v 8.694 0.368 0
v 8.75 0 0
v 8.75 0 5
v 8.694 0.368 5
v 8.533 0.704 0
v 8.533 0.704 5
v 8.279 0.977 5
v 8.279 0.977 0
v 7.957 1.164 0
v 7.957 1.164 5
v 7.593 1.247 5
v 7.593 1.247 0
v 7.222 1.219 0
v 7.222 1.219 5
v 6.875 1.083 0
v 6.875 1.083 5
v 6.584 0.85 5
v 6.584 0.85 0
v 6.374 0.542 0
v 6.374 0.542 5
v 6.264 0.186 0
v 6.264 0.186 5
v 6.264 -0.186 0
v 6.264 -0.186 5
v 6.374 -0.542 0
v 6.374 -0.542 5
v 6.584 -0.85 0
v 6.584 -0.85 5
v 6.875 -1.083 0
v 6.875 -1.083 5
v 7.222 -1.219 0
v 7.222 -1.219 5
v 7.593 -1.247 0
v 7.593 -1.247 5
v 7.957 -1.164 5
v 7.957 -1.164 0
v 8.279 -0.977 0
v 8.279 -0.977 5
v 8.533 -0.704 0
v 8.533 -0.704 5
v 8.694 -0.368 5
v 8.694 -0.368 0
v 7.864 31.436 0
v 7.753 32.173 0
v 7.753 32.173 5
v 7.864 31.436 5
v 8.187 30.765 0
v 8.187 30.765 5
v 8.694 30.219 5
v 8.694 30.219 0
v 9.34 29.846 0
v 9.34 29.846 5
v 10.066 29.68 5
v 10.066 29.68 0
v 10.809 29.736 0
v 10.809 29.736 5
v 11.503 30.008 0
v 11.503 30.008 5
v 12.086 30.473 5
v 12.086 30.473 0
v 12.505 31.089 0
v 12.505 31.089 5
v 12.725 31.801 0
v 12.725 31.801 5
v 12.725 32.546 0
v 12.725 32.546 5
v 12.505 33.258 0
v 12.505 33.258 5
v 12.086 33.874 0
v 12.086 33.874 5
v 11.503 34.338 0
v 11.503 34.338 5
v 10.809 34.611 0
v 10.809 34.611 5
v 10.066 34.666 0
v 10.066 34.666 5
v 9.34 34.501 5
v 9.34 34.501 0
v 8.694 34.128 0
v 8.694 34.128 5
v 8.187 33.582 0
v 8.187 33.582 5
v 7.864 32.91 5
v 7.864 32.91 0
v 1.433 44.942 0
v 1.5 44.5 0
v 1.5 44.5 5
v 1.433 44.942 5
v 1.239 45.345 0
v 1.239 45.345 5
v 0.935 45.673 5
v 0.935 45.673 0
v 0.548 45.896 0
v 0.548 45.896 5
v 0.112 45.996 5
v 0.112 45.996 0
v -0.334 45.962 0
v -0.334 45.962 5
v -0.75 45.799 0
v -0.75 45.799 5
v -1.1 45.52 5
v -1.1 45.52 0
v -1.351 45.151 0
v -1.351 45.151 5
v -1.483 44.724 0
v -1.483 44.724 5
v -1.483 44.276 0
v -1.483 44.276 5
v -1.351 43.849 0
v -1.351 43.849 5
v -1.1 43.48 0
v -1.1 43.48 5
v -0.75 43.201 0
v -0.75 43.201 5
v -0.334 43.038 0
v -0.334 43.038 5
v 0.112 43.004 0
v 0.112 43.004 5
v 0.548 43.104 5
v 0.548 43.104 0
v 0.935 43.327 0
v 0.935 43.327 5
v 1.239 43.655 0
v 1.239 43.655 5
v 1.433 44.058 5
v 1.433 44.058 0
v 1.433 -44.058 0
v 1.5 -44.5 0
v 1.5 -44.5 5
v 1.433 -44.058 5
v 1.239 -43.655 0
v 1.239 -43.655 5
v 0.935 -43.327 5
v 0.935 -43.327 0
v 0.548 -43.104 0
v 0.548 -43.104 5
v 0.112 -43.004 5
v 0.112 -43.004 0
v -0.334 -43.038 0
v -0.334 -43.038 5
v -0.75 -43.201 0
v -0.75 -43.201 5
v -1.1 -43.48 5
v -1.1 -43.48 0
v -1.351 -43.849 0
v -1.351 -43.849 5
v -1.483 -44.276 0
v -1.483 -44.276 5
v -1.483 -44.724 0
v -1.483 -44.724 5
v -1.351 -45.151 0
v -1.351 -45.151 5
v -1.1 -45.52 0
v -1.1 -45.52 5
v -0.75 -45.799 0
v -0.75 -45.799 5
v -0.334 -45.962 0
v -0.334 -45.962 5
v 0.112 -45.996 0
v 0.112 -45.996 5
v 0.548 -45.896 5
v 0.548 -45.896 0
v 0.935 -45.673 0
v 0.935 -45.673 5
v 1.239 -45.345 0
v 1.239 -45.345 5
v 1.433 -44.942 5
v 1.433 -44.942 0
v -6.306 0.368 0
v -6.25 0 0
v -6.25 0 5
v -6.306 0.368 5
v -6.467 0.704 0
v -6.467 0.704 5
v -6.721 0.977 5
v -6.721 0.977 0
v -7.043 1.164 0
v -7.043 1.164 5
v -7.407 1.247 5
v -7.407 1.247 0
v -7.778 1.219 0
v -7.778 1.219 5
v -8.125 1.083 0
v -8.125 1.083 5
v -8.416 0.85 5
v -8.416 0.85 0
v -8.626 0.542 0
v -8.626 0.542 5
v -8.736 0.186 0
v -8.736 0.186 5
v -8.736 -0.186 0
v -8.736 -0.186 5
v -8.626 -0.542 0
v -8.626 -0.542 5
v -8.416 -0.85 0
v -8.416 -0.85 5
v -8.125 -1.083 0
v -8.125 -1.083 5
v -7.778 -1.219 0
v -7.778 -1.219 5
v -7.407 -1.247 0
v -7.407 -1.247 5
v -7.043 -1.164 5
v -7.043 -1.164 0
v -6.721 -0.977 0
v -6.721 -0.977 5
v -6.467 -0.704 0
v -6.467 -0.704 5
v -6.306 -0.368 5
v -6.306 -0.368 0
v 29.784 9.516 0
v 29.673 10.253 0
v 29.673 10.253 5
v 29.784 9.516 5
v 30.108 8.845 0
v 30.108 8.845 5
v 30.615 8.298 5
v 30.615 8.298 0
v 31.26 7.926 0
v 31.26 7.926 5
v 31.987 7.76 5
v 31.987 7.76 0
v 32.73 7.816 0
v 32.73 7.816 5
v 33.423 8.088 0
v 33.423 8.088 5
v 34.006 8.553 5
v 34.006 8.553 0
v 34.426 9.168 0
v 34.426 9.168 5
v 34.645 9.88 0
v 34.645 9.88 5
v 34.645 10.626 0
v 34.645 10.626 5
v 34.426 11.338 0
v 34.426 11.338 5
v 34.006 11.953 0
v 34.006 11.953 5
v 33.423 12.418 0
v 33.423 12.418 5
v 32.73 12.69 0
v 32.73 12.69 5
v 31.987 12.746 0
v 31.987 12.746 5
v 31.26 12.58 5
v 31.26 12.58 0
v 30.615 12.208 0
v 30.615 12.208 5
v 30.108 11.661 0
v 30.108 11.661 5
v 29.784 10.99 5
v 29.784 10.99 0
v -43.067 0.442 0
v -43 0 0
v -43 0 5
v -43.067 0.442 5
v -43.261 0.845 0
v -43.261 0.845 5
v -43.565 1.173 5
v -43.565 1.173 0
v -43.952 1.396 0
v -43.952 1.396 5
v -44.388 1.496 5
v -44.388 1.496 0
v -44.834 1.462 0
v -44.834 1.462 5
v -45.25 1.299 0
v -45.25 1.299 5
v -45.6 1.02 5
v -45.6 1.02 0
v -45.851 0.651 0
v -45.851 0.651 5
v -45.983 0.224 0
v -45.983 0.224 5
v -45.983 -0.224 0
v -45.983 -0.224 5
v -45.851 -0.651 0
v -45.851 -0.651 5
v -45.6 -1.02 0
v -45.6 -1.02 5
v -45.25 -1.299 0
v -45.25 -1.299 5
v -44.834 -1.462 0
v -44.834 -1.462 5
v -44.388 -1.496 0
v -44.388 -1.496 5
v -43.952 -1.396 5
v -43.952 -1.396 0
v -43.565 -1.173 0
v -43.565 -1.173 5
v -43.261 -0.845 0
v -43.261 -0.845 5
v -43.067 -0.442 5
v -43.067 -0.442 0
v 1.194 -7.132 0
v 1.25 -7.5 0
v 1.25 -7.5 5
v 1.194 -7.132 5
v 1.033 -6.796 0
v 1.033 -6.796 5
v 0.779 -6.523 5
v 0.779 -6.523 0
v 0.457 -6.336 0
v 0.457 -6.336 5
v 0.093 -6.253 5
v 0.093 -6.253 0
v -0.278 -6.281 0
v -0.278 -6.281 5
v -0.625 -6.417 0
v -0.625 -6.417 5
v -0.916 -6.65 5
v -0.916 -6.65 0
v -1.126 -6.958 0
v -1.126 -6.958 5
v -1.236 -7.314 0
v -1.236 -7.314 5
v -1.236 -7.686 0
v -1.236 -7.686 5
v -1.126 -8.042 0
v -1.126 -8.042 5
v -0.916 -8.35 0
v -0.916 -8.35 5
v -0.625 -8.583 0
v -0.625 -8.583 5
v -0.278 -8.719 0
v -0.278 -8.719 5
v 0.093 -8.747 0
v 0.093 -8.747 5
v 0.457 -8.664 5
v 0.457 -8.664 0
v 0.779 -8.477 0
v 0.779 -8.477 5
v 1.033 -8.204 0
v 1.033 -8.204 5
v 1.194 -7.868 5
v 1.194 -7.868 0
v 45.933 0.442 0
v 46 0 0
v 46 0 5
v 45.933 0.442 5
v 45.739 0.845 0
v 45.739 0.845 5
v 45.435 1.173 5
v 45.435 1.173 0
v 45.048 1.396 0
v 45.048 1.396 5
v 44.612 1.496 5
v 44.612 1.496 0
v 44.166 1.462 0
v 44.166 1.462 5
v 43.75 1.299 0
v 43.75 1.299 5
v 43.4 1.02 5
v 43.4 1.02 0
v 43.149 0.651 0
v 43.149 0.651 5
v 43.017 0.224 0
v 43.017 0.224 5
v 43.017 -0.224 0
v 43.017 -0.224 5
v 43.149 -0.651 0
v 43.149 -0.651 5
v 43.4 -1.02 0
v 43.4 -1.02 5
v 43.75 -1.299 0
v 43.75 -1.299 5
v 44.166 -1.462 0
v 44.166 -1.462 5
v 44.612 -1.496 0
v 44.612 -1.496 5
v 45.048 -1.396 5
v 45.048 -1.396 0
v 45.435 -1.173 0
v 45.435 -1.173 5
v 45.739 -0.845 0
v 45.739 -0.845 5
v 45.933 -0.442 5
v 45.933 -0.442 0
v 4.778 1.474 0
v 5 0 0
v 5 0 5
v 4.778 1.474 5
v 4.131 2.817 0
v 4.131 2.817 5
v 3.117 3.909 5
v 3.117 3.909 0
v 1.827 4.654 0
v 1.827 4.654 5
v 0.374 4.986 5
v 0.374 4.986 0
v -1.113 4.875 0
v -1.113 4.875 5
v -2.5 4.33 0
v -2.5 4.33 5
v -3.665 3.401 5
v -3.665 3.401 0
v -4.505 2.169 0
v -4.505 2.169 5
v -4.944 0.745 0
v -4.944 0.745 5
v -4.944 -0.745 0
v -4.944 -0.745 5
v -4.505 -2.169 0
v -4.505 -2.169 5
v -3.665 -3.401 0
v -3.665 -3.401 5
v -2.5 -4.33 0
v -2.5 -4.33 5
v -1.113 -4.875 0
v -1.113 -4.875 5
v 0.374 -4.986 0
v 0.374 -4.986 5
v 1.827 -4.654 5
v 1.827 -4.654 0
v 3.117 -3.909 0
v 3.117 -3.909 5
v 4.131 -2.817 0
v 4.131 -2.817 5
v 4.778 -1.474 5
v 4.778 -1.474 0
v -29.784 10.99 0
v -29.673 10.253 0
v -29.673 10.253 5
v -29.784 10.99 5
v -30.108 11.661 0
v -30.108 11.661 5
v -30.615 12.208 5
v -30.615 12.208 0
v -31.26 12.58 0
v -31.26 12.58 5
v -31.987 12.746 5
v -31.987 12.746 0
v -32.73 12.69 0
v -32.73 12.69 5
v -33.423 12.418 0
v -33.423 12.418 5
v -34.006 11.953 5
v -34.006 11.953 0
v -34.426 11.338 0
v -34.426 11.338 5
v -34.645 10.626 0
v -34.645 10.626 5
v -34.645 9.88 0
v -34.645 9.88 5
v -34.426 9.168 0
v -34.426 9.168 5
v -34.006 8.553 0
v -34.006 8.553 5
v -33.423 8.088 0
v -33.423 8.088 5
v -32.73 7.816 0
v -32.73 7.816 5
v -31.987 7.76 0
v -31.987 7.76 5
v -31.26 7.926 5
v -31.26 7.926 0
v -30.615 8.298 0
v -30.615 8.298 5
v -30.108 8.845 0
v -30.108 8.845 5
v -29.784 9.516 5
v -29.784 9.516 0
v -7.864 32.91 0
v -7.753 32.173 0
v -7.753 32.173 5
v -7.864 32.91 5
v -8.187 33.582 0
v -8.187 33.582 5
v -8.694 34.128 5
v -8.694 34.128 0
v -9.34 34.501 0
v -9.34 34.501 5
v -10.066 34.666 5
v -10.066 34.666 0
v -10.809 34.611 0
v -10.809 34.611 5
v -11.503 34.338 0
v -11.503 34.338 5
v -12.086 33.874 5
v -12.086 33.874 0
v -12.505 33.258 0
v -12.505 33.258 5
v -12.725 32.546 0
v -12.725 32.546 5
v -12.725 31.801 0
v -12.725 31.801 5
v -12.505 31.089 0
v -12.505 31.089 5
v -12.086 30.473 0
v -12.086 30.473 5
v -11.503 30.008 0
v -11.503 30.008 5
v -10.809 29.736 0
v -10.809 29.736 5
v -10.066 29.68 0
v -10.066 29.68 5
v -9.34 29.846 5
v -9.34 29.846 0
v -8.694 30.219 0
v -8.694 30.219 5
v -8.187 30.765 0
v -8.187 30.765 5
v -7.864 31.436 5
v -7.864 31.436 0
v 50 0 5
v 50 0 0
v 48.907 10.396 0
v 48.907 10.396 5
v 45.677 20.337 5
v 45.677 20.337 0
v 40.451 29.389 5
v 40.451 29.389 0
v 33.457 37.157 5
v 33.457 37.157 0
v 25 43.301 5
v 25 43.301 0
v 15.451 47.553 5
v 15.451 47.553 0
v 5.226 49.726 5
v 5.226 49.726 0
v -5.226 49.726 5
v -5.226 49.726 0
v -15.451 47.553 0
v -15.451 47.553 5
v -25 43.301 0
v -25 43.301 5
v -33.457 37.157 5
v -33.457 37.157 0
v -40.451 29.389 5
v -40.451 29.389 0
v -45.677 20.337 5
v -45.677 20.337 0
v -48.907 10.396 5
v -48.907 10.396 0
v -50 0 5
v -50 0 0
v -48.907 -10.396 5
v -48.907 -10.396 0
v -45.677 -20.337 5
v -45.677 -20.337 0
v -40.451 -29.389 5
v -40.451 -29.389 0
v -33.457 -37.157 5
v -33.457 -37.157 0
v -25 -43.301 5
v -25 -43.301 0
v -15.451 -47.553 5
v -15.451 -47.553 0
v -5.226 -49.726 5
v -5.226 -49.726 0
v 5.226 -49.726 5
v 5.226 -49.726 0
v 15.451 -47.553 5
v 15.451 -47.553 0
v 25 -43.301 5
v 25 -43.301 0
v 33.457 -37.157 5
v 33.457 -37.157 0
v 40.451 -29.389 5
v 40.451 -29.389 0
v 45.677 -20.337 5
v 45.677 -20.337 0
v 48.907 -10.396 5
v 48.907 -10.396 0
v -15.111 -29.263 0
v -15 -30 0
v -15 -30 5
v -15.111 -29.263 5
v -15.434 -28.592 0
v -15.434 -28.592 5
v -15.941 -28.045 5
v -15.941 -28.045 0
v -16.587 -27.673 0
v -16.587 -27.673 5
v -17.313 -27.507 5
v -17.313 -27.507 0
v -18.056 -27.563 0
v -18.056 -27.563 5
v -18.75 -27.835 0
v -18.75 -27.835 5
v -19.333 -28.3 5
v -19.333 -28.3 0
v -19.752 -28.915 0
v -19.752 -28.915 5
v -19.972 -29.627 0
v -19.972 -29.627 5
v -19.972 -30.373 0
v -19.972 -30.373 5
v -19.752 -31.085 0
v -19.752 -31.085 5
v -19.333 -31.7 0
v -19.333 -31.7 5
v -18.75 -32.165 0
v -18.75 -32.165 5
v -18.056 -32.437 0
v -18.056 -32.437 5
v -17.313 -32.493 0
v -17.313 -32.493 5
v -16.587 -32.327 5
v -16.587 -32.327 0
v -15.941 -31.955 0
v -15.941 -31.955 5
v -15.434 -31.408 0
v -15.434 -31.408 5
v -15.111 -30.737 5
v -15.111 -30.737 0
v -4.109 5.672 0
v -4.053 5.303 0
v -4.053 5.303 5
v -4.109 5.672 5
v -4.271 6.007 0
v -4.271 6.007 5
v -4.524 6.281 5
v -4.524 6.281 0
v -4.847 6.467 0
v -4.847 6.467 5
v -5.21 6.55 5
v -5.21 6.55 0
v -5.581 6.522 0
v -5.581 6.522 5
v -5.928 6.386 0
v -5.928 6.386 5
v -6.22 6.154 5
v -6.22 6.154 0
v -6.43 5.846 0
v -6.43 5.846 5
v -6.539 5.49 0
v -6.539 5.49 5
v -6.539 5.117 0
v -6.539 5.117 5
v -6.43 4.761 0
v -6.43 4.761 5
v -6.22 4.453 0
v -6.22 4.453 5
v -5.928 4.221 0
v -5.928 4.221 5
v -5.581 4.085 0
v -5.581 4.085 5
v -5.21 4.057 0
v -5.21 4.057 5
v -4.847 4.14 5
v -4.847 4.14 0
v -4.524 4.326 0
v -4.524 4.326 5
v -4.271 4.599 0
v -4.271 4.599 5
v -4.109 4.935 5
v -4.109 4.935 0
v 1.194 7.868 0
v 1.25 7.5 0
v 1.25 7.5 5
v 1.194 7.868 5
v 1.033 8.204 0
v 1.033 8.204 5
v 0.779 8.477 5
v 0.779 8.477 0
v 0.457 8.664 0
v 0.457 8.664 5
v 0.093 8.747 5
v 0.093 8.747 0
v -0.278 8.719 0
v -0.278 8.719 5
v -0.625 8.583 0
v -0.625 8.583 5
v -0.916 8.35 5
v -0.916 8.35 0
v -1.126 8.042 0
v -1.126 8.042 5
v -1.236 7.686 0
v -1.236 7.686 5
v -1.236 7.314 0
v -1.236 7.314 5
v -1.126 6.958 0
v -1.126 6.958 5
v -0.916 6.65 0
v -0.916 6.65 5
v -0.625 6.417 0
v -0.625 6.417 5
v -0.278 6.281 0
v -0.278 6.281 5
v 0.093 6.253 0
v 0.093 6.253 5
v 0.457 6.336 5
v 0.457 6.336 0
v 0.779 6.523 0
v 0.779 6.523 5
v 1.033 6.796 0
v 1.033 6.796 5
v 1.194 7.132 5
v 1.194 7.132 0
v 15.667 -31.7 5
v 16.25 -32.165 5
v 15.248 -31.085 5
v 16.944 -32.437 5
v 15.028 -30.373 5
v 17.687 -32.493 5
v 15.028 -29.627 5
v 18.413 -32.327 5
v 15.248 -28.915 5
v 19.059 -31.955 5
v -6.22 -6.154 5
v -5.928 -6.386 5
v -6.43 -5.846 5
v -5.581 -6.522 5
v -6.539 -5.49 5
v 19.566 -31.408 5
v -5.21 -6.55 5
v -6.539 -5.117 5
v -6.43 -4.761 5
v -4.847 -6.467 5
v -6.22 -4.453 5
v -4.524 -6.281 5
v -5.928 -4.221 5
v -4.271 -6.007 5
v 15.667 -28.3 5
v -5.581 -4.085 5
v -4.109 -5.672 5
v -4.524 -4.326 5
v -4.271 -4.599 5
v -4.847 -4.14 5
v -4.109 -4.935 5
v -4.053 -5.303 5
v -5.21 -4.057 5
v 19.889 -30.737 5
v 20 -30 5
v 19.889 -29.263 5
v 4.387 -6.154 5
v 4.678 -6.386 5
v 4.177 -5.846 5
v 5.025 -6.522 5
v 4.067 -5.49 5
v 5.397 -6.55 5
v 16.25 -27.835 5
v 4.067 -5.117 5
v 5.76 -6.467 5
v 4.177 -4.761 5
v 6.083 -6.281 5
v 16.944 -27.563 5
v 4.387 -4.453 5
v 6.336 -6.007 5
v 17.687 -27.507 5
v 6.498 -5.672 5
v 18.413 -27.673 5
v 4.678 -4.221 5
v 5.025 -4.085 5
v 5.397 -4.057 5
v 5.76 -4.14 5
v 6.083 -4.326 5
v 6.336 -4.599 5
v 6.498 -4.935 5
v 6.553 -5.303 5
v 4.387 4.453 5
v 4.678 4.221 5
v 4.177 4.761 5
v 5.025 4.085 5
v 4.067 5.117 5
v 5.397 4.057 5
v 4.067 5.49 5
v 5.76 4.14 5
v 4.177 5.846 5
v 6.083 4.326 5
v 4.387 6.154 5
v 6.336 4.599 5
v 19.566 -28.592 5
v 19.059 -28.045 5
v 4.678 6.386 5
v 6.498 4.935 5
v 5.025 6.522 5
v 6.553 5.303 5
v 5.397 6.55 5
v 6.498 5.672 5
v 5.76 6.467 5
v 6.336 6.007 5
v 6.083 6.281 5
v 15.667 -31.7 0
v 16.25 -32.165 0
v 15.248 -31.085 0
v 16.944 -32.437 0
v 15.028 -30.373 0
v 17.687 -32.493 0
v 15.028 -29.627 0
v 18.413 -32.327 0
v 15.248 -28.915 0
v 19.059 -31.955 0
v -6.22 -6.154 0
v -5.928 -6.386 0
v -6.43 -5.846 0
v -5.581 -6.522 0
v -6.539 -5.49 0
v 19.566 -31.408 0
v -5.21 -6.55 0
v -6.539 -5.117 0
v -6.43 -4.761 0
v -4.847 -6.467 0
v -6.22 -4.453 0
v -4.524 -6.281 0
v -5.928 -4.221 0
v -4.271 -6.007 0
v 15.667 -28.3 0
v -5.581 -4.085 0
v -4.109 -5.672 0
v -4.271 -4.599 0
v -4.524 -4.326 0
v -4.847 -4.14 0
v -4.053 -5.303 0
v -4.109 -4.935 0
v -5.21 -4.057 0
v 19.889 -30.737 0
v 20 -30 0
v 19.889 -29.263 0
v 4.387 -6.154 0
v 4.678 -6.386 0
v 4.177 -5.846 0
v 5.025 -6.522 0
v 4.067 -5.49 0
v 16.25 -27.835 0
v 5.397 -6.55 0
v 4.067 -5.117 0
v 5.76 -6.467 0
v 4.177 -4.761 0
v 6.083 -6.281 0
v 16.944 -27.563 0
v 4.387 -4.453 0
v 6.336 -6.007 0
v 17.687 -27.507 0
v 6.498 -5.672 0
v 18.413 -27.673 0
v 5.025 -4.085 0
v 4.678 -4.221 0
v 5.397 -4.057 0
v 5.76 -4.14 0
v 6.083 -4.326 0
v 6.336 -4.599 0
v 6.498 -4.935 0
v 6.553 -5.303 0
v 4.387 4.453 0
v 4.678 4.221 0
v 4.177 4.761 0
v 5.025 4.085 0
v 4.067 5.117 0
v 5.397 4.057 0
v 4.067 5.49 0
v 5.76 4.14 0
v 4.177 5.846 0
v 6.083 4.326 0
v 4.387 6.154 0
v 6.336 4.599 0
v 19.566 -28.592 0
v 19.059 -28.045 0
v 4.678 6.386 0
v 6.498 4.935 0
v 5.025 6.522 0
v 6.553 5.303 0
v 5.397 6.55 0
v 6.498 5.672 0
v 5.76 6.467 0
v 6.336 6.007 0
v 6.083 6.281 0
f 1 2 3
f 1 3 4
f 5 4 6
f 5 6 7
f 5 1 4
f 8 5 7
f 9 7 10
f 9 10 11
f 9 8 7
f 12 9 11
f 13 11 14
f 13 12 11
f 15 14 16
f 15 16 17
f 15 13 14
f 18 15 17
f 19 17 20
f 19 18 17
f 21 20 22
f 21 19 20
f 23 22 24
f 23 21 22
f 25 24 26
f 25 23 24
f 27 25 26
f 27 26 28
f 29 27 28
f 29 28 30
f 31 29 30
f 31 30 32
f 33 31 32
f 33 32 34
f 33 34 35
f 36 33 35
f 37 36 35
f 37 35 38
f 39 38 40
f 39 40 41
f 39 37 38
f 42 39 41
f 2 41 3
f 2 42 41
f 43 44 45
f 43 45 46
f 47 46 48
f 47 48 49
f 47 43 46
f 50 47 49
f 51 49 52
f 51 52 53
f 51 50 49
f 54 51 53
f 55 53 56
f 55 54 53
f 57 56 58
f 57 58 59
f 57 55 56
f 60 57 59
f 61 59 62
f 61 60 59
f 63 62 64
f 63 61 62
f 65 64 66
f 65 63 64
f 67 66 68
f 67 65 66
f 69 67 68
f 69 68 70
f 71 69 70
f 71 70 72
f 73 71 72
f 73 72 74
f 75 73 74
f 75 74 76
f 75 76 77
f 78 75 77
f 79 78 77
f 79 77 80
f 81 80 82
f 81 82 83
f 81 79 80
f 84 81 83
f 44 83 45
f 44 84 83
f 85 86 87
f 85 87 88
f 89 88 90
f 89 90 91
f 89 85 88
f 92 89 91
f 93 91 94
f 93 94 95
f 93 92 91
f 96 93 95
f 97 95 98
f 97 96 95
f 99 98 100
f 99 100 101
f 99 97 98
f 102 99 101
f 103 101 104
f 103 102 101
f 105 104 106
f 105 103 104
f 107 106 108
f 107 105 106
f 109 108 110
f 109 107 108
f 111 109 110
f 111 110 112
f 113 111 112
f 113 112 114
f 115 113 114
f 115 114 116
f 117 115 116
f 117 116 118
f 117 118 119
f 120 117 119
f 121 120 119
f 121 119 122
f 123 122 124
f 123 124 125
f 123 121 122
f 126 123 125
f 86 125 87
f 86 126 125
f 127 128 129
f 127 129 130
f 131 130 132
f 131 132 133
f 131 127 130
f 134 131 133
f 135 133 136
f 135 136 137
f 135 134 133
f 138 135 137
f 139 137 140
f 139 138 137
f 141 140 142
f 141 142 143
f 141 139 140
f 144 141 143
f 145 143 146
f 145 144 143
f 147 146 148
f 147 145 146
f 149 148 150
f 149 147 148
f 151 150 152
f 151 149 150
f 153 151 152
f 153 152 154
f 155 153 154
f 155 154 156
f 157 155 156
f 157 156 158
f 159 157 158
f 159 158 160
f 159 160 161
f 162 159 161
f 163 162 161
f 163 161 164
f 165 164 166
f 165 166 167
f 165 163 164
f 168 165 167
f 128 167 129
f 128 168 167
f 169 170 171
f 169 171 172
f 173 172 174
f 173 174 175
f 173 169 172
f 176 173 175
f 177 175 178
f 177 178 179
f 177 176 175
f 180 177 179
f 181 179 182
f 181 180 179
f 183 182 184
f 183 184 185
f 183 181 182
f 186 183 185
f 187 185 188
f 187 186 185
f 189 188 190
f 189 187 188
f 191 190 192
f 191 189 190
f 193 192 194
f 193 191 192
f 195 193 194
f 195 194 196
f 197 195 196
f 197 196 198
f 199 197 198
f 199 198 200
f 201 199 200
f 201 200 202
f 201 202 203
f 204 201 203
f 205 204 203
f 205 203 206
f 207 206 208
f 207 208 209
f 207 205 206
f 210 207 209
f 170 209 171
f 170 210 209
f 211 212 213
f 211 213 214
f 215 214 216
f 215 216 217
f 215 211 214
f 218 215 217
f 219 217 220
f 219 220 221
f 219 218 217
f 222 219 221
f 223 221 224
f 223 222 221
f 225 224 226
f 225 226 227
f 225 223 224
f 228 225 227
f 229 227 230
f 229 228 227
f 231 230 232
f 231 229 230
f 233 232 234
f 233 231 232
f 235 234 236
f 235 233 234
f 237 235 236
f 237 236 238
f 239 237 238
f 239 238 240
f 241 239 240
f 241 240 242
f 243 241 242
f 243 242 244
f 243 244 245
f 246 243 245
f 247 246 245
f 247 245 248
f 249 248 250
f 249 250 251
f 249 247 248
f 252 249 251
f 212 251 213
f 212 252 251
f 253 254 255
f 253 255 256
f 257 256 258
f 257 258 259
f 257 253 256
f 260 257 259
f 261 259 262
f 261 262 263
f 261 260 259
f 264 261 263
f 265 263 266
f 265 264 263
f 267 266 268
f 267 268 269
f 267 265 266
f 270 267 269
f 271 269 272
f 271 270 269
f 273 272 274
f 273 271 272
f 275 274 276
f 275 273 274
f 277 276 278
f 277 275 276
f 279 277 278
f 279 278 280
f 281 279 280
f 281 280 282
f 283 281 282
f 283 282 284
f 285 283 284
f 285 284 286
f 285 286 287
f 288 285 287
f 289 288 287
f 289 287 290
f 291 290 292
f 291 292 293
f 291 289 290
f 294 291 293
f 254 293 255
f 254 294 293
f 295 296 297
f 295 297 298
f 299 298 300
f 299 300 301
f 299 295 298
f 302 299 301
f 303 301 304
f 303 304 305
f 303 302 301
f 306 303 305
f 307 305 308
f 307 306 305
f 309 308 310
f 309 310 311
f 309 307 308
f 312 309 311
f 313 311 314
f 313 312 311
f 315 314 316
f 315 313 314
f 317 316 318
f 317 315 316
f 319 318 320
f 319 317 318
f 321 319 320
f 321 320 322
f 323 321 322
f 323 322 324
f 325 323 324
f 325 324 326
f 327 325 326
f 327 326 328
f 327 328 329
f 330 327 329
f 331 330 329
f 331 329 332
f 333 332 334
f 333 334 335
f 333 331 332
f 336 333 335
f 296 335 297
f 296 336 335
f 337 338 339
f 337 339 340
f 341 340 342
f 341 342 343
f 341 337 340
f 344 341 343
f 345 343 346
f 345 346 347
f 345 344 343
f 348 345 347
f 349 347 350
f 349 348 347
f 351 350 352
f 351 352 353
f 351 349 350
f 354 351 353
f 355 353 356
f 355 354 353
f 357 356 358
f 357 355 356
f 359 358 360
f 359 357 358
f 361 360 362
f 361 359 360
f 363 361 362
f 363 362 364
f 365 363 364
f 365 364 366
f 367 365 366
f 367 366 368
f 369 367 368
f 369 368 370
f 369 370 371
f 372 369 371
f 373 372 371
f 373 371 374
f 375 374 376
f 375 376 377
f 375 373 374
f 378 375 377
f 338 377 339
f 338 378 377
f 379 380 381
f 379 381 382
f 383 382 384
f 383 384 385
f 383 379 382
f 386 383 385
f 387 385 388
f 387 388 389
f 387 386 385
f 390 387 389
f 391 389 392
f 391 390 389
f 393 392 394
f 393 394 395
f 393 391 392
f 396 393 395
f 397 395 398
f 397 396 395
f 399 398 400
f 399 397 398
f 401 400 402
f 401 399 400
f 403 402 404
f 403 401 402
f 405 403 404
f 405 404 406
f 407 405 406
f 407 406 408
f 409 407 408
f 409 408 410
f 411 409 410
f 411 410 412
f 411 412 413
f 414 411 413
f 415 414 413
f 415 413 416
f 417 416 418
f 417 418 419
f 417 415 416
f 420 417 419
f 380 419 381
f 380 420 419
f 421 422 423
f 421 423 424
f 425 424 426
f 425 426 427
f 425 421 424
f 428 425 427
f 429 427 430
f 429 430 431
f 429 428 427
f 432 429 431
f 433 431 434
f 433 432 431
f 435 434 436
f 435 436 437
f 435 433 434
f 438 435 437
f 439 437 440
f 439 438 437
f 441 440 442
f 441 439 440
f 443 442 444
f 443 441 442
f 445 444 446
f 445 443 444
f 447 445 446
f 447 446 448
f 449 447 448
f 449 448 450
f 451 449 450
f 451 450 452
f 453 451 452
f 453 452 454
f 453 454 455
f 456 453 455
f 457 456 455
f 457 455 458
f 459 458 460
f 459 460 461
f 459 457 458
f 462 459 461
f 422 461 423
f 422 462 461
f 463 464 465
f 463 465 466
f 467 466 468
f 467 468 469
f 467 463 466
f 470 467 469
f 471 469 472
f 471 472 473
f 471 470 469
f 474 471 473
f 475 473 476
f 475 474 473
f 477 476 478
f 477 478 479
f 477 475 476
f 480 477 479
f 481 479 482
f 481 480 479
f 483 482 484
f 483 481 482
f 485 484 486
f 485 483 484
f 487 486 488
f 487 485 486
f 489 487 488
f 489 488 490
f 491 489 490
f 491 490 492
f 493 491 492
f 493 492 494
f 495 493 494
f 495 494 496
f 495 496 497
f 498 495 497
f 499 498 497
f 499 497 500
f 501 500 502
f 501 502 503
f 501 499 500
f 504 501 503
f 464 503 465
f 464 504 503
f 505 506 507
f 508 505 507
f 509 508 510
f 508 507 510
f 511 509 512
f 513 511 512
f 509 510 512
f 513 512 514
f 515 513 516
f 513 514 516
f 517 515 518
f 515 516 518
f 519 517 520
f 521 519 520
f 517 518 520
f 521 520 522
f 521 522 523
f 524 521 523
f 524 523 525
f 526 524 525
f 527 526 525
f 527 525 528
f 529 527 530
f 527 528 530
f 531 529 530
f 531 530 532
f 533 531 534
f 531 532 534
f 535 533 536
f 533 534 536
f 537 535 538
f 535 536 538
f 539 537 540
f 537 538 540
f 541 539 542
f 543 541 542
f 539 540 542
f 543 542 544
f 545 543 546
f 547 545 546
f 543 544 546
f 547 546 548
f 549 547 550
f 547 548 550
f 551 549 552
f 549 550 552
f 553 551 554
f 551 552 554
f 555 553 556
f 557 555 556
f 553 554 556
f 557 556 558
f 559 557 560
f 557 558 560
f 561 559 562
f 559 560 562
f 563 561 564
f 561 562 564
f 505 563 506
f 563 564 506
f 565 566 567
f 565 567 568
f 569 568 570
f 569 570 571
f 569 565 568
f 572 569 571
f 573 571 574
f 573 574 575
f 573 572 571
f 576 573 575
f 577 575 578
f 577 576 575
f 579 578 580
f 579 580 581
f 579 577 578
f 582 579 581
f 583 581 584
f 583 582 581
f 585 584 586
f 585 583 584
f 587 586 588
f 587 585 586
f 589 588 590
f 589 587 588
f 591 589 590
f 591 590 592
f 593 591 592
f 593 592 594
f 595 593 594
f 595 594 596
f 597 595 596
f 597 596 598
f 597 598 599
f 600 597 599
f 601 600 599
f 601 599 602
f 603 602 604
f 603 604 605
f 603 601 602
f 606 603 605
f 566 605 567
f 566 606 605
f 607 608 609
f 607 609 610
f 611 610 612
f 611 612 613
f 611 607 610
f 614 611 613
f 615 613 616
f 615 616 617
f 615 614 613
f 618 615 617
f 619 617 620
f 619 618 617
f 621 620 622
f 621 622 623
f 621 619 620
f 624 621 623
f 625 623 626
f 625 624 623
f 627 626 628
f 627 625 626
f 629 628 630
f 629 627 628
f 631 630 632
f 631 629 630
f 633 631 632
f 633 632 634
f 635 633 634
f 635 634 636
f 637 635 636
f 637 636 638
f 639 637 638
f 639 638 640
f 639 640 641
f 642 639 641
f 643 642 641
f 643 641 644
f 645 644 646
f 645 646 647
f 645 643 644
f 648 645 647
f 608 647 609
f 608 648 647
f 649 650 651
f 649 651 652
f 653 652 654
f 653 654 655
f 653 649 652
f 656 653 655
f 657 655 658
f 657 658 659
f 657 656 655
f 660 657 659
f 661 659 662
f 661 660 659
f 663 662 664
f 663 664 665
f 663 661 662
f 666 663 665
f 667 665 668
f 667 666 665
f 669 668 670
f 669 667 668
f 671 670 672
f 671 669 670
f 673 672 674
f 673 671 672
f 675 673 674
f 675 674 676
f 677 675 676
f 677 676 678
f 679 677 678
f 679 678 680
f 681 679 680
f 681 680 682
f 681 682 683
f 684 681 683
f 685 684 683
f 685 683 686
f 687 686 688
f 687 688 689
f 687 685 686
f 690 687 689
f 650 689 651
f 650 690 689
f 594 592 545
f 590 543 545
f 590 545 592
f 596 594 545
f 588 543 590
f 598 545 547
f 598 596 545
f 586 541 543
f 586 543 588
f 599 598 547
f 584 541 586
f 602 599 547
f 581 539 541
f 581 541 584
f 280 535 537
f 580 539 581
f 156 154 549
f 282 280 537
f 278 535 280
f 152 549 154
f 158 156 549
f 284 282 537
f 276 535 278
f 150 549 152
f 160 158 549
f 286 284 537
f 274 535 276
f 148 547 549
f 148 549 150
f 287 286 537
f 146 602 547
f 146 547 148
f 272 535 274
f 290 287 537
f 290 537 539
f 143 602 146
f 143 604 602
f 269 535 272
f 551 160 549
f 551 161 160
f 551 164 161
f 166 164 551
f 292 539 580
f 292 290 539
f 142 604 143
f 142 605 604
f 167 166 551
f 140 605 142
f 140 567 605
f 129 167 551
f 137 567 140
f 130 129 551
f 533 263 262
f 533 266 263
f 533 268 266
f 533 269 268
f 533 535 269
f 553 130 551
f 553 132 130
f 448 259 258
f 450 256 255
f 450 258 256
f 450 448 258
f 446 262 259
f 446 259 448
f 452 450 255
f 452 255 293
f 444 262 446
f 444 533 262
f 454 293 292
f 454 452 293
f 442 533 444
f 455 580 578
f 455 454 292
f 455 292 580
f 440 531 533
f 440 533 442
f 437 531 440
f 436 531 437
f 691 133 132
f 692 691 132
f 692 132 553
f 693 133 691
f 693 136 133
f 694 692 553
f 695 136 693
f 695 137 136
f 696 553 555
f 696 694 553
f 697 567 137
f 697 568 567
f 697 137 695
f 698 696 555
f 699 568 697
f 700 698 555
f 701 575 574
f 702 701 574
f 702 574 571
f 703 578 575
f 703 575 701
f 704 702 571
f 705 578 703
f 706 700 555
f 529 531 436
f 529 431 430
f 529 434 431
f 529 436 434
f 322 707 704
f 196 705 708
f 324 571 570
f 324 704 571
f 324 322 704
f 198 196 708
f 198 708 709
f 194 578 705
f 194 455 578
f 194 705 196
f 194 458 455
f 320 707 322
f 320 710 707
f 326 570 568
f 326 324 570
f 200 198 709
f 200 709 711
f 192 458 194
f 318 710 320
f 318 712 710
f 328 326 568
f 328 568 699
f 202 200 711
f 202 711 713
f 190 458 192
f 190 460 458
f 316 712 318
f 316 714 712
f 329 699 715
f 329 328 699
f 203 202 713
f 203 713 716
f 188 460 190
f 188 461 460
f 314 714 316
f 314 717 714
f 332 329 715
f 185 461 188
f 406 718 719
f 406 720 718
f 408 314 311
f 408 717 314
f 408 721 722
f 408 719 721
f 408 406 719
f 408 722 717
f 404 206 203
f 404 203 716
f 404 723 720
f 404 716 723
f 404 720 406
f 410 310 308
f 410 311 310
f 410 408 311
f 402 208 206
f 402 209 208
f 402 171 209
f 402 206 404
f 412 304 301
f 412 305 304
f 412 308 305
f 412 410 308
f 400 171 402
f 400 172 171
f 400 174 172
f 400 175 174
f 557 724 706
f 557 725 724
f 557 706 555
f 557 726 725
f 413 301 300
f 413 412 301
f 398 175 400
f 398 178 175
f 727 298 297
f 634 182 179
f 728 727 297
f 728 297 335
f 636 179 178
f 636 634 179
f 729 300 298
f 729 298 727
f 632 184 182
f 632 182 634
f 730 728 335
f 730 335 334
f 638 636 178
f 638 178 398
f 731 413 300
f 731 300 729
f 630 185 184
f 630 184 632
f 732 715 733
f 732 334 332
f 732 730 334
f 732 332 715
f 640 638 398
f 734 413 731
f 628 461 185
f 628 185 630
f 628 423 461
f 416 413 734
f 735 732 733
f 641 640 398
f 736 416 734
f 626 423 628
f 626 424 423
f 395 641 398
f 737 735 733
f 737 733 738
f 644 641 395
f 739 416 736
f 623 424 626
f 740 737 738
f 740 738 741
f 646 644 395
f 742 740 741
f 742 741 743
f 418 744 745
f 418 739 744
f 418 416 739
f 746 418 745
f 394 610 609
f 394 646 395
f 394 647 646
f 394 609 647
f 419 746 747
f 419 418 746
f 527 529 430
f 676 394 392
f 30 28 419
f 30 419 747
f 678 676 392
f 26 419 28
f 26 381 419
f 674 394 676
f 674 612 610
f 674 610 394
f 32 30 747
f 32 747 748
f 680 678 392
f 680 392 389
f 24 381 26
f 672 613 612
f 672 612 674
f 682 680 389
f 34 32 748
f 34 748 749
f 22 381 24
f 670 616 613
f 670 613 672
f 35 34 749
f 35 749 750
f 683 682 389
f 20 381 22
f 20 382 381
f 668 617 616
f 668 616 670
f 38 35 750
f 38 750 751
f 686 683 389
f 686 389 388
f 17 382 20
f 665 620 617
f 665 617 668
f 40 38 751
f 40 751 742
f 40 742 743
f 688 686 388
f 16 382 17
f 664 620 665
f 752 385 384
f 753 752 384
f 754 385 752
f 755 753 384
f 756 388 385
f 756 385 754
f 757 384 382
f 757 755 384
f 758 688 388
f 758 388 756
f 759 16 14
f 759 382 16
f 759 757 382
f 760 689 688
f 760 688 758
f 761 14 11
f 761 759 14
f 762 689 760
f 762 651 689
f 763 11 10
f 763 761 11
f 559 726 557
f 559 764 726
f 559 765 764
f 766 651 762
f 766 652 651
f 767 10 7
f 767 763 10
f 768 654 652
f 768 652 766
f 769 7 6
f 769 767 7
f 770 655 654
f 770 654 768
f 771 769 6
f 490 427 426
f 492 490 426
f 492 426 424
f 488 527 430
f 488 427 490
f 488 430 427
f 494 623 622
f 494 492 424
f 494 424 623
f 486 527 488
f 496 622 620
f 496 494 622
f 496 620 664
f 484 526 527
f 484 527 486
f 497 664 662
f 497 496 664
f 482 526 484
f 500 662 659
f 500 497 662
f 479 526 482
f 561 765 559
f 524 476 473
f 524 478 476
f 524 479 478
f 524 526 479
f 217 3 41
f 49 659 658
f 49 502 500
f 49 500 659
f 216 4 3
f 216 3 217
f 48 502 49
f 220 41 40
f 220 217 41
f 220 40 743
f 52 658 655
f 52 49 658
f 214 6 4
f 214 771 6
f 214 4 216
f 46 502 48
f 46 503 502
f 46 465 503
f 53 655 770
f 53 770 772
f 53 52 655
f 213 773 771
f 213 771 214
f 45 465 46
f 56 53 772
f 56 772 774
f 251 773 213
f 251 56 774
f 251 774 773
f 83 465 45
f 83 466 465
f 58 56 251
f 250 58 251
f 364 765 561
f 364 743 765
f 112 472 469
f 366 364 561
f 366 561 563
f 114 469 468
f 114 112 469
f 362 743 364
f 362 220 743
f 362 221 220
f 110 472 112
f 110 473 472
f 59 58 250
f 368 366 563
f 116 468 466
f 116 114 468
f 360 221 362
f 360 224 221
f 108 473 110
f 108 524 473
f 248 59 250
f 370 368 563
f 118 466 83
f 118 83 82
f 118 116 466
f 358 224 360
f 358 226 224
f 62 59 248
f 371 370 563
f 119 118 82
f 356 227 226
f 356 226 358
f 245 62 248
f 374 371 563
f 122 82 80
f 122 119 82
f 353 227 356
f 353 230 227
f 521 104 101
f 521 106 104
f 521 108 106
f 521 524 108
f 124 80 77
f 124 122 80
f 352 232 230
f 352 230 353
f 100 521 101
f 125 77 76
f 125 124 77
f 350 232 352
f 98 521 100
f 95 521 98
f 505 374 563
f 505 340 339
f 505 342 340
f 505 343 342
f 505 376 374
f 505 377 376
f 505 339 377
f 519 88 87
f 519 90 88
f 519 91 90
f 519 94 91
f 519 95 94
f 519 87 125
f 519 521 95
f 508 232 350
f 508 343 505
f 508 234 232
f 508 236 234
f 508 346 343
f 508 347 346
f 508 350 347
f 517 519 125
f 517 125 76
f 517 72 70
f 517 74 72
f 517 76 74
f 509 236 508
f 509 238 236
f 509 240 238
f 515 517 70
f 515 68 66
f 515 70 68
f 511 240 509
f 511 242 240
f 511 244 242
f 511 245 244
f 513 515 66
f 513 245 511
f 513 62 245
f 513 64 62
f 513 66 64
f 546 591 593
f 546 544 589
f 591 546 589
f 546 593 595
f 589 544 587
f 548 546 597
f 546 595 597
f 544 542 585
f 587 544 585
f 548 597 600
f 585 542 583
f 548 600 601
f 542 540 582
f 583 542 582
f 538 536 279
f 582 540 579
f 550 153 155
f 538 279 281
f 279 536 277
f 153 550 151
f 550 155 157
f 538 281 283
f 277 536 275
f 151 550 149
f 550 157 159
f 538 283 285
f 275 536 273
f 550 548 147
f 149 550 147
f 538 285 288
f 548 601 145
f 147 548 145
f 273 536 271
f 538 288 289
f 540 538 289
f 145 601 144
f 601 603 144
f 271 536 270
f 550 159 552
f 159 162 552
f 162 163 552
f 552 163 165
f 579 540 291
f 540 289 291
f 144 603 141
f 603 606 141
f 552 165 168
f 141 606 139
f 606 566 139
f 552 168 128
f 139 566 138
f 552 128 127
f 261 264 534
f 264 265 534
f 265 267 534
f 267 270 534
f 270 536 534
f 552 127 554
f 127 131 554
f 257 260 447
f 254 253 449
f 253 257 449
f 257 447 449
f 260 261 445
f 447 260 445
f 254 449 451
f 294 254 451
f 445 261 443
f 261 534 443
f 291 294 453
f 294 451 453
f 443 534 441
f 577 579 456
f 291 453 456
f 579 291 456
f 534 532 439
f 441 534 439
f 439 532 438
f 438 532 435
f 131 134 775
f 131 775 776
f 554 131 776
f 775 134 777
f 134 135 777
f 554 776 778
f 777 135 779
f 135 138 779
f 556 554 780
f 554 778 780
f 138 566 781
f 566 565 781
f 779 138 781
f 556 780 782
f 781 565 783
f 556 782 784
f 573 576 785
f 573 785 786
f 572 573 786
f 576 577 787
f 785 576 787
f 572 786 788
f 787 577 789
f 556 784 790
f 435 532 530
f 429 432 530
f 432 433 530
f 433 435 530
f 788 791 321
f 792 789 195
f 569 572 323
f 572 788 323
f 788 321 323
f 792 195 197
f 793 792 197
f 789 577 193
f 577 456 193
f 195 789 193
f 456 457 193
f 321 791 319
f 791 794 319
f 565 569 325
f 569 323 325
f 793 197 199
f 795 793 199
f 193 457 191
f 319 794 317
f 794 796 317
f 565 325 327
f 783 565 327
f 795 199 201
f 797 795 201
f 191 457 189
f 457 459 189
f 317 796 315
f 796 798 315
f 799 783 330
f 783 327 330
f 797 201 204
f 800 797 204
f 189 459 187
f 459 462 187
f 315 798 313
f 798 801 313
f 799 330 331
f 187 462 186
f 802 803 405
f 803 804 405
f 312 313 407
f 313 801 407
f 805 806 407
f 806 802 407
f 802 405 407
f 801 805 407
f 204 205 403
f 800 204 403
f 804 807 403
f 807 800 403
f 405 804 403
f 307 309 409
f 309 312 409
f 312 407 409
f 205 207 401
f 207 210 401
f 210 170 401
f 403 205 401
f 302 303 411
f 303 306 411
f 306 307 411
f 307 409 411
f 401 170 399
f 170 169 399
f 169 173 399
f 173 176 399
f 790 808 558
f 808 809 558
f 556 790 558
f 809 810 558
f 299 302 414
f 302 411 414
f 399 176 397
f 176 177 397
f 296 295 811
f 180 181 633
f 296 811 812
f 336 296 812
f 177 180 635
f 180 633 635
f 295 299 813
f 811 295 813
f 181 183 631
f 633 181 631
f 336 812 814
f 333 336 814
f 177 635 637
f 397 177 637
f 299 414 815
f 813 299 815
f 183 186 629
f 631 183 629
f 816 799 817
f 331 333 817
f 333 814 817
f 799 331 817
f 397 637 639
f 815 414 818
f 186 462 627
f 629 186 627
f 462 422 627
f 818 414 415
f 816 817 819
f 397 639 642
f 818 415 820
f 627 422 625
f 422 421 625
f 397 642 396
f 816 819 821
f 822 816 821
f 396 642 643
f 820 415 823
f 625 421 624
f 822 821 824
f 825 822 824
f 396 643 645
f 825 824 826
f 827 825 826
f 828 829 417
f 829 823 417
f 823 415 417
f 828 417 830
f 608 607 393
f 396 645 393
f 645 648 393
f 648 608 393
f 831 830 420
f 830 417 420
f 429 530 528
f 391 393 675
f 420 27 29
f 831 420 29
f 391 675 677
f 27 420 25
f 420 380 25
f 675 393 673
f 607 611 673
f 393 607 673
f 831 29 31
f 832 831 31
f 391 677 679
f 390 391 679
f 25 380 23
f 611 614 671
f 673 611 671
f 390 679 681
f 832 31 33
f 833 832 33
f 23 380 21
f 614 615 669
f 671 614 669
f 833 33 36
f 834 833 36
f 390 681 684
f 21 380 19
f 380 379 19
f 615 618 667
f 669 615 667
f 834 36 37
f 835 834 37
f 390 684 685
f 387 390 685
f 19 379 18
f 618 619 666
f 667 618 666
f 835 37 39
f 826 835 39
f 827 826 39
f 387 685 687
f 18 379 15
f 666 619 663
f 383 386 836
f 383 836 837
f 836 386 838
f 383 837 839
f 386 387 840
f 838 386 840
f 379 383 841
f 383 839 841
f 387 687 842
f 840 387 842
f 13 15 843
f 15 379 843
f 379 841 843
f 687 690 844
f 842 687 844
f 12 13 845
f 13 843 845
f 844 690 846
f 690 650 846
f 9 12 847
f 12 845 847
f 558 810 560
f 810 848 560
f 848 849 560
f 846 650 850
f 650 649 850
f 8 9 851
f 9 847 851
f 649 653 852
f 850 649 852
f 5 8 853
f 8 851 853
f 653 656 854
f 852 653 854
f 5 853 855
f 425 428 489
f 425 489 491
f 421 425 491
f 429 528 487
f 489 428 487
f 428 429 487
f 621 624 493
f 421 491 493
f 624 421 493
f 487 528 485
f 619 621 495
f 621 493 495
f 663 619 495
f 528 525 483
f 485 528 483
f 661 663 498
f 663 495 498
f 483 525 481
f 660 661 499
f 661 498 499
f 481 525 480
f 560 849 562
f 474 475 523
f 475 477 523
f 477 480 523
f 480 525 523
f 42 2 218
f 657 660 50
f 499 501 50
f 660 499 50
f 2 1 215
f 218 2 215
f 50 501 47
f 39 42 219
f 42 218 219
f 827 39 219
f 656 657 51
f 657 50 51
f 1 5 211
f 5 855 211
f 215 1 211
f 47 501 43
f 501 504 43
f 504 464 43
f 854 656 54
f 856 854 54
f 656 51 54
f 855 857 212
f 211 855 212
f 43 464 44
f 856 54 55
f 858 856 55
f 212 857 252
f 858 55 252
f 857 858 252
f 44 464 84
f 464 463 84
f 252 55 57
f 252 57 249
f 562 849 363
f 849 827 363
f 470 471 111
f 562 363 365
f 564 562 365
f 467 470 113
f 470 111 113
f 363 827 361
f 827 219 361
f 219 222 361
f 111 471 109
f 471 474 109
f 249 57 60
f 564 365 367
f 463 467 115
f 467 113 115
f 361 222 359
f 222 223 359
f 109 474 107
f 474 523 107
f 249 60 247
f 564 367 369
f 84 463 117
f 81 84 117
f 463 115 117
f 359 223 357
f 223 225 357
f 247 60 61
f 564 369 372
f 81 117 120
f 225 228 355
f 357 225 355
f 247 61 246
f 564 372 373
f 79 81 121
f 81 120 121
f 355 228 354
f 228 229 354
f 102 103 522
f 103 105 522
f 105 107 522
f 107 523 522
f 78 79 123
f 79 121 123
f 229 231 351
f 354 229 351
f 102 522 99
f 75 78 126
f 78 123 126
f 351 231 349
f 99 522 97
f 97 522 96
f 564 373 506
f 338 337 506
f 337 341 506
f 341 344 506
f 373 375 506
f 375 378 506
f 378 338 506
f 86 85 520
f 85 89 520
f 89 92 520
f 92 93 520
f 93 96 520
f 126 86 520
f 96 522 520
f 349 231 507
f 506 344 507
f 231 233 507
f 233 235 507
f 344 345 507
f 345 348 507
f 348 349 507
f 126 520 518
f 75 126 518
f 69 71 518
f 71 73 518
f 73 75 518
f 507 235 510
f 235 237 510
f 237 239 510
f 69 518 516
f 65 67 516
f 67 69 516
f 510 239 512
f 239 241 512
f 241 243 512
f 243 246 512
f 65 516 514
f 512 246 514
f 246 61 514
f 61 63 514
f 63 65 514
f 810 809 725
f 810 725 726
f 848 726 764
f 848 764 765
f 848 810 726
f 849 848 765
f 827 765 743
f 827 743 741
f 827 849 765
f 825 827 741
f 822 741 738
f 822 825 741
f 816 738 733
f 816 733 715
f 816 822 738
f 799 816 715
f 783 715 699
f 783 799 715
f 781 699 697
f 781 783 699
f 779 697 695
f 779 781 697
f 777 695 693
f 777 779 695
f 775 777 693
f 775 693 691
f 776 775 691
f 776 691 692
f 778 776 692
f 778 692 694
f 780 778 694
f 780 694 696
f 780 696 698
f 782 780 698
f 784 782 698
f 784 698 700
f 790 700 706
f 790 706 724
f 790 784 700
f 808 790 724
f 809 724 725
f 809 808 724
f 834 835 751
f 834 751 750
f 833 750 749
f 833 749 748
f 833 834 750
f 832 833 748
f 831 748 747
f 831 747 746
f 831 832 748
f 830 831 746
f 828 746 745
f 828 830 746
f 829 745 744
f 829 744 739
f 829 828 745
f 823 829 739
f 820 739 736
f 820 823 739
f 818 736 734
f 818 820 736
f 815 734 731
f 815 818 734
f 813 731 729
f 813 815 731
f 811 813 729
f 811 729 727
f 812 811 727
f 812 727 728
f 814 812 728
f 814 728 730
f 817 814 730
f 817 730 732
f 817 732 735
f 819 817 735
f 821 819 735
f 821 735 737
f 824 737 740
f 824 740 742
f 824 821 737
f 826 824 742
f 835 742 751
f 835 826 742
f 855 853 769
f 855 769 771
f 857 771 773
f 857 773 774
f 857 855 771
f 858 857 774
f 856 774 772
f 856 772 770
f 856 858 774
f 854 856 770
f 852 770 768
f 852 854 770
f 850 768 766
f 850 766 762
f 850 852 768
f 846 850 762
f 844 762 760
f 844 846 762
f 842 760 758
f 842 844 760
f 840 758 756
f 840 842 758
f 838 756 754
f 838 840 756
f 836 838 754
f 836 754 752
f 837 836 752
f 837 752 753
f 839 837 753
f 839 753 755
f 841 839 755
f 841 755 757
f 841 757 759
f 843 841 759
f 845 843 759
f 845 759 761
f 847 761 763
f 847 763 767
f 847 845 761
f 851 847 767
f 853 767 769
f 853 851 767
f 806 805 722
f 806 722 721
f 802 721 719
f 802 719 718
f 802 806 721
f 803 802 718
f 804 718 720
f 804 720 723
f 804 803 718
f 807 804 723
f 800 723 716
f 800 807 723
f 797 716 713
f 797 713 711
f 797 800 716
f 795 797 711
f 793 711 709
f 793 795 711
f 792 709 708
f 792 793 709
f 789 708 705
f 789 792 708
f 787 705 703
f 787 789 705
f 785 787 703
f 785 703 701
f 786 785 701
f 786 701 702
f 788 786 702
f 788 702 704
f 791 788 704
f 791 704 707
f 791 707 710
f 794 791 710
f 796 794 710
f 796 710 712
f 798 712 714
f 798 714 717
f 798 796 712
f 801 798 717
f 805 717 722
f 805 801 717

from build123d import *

# Parameters (mm, degrees)
SKETCH_1_R      = 50
SKETCH_1_R_2    = 1.5
SKETCH_1_R_3    = 1.25
SKETCH_1_R_4    = 5
SKETCH_1_R_5    = 2.5
EXTRUDE_1_DEPTH = 5


with BuildPart() as part:
    # 草图1 → 凸台-拉伸1 (new body)
    with BuildSketch(Plane.XY):
        Circle(SKETCH_1_R)
        with Locations((0, 44.5)):
            Circle(SKETCH_1_R_2, mode=Mode.SUBTRACT)
        with Locations((44.5, 0)):
            Circle(SKETCH_1_R_2, mode=Mode.SUBTRACT)
        with Locations((0, -44.5)):
            Circle(SKETCH_1_R_2, mode=Mode.SUBTRACT)
        with Locations((-44.5, 0)):
            Circle(SKETCH_1_R_2, mode=Mode.SUBTRACT)
        with Locations((0, 7.5)):
            Circle(SKETCH_1_R_3, mode=Mode.SUBTRACT)
        with Locations((5.303300859, 5.303300859)):
            Circle(SKETCH_1_R_3, mode=Mode.SUBTRACT)
        with Locations((7.5, 0)):
            Circle(SKETCH_1_R_3, mode=Mode.SUBTRACT)
        with Locations((5.303300859, -5.303300859)):
            Circle(SKETCH_1_R_3, mode=Mode.SUBTRACT)
        with Locations((0, -7.5)):
            Circle(SKETCH_1_R_3, mode=Mode.SUBTRACT)
        with Locations((-5.303300859, -5.303300859)):
            Circle(SKETCH_1_R_3, mode=Mode.SUBTRACT)
        with Locations((-7.5, 0)):
            Circle(SKETCH_1_R_3, mode=Mode.SUBTRACT)
        with Locations((-5.303300859, 5.303300859)):
            Circle(SKETCH_1_R_3, mode=Mode.SUBTRACT)
        Circle(SKETCH_1_R_4, mode=Mode.SUBTRACT)
        with Locations((-10.253048327, 32.173358544)):
            Circle(SKETCH_1_R_5, mode=Mode.SUBTRACT)
        with Locations((-32.173358544, 10.253048327)):
            Circle(SKETCH_1_R_5, mode=Mode.SUBTRACT)
        with Locations(Location((10.253048327, 32.173358544, 0), (0, 0, 180))):
            Circle(SKETCH_1_R_5, mode=Mode.SUBTRACT)
        with Locations(Location((32.173358544, 10.253048327, 0), (0, 0, 180))):
            Circle(SKETCH_1_R_5, mode=Mode.SUBTRACT)
        with Locations((-17.5, -30)):
            Circle(SKETCH_1_R_5, mode=Mode.SUBTRACT)
        with Locations((17.5, -30)):
            Circle(SKETCH_1_R_5, mode=Mode.SUBTRACT)
    extrude(amount=EXTRUDE_1_DEPTH)


solid = part.part
